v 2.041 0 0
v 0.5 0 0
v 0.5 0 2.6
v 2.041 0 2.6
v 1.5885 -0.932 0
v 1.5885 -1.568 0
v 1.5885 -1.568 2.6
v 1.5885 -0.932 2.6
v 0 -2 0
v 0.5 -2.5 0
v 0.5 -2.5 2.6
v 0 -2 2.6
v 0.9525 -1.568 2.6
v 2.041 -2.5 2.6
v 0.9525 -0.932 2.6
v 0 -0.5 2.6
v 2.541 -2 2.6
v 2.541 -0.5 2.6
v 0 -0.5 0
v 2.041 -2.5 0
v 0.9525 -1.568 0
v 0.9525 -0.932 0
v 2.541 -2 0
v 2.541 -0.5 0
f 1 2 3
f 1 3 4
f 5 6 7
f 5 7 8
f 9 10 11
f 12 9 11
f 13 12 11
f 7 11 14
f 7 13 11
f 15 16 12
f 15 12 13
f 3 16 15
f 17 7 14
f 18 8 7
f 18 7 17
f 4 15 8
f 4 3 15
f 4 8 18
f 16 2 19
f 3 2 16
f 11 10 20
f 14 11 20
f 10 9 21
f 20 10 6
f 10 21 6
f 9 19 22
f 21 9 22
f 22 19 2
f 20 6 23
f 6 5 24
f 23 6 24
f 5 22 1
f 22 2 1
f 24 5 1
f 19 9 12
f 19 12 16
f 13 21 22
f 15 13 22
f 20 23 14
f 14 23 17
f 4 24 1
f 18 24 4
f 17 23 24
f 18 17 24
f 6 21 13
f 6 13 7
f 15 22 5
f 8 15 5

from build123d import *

# Parameters (mm, degrees)
CROQUIS1_W              = 2.541
CROQUIS1_H              = 2.5
CROQUIS1_W_2            = 0.636
CROQUIS1_H_2            = 0.636
SALIENTE_EXTRUIR2_DEPTH = 2.6
CHAFL_N2_SIZE           = 0.5


with BuildPart() as part:
    # Croquis1 → Saliente-Extruir2 (new body)
    with BuildSketch(Plane.XY):
        with Locations((1.2705, -1.25)):
            Rectangle(CROQUIS1_W, CROQUIS1_H)
        with Locations((1.2705, -1.25)):
            Rectangle(CROQUIS1_W_2, CROQUIS1_H_2, mode=Mode.SUBTRACT)
    extrude(amount=SALIENTE_EXTRUIR2_DEPTH)

    # Chaflán2
    chafl_n2_edges = [part.edges().sort_by_distance(p)[0] for p in [
        (0, 0, 1.3),
        (2.541, 0, 1.3),
        (2.541, -2.5, 1.3),
        (0, -2.5, 1.3),
    ]]
    chamfer(chafl_n2_edges, length=CHAFL_N2_SIZE)


solid = part.part
